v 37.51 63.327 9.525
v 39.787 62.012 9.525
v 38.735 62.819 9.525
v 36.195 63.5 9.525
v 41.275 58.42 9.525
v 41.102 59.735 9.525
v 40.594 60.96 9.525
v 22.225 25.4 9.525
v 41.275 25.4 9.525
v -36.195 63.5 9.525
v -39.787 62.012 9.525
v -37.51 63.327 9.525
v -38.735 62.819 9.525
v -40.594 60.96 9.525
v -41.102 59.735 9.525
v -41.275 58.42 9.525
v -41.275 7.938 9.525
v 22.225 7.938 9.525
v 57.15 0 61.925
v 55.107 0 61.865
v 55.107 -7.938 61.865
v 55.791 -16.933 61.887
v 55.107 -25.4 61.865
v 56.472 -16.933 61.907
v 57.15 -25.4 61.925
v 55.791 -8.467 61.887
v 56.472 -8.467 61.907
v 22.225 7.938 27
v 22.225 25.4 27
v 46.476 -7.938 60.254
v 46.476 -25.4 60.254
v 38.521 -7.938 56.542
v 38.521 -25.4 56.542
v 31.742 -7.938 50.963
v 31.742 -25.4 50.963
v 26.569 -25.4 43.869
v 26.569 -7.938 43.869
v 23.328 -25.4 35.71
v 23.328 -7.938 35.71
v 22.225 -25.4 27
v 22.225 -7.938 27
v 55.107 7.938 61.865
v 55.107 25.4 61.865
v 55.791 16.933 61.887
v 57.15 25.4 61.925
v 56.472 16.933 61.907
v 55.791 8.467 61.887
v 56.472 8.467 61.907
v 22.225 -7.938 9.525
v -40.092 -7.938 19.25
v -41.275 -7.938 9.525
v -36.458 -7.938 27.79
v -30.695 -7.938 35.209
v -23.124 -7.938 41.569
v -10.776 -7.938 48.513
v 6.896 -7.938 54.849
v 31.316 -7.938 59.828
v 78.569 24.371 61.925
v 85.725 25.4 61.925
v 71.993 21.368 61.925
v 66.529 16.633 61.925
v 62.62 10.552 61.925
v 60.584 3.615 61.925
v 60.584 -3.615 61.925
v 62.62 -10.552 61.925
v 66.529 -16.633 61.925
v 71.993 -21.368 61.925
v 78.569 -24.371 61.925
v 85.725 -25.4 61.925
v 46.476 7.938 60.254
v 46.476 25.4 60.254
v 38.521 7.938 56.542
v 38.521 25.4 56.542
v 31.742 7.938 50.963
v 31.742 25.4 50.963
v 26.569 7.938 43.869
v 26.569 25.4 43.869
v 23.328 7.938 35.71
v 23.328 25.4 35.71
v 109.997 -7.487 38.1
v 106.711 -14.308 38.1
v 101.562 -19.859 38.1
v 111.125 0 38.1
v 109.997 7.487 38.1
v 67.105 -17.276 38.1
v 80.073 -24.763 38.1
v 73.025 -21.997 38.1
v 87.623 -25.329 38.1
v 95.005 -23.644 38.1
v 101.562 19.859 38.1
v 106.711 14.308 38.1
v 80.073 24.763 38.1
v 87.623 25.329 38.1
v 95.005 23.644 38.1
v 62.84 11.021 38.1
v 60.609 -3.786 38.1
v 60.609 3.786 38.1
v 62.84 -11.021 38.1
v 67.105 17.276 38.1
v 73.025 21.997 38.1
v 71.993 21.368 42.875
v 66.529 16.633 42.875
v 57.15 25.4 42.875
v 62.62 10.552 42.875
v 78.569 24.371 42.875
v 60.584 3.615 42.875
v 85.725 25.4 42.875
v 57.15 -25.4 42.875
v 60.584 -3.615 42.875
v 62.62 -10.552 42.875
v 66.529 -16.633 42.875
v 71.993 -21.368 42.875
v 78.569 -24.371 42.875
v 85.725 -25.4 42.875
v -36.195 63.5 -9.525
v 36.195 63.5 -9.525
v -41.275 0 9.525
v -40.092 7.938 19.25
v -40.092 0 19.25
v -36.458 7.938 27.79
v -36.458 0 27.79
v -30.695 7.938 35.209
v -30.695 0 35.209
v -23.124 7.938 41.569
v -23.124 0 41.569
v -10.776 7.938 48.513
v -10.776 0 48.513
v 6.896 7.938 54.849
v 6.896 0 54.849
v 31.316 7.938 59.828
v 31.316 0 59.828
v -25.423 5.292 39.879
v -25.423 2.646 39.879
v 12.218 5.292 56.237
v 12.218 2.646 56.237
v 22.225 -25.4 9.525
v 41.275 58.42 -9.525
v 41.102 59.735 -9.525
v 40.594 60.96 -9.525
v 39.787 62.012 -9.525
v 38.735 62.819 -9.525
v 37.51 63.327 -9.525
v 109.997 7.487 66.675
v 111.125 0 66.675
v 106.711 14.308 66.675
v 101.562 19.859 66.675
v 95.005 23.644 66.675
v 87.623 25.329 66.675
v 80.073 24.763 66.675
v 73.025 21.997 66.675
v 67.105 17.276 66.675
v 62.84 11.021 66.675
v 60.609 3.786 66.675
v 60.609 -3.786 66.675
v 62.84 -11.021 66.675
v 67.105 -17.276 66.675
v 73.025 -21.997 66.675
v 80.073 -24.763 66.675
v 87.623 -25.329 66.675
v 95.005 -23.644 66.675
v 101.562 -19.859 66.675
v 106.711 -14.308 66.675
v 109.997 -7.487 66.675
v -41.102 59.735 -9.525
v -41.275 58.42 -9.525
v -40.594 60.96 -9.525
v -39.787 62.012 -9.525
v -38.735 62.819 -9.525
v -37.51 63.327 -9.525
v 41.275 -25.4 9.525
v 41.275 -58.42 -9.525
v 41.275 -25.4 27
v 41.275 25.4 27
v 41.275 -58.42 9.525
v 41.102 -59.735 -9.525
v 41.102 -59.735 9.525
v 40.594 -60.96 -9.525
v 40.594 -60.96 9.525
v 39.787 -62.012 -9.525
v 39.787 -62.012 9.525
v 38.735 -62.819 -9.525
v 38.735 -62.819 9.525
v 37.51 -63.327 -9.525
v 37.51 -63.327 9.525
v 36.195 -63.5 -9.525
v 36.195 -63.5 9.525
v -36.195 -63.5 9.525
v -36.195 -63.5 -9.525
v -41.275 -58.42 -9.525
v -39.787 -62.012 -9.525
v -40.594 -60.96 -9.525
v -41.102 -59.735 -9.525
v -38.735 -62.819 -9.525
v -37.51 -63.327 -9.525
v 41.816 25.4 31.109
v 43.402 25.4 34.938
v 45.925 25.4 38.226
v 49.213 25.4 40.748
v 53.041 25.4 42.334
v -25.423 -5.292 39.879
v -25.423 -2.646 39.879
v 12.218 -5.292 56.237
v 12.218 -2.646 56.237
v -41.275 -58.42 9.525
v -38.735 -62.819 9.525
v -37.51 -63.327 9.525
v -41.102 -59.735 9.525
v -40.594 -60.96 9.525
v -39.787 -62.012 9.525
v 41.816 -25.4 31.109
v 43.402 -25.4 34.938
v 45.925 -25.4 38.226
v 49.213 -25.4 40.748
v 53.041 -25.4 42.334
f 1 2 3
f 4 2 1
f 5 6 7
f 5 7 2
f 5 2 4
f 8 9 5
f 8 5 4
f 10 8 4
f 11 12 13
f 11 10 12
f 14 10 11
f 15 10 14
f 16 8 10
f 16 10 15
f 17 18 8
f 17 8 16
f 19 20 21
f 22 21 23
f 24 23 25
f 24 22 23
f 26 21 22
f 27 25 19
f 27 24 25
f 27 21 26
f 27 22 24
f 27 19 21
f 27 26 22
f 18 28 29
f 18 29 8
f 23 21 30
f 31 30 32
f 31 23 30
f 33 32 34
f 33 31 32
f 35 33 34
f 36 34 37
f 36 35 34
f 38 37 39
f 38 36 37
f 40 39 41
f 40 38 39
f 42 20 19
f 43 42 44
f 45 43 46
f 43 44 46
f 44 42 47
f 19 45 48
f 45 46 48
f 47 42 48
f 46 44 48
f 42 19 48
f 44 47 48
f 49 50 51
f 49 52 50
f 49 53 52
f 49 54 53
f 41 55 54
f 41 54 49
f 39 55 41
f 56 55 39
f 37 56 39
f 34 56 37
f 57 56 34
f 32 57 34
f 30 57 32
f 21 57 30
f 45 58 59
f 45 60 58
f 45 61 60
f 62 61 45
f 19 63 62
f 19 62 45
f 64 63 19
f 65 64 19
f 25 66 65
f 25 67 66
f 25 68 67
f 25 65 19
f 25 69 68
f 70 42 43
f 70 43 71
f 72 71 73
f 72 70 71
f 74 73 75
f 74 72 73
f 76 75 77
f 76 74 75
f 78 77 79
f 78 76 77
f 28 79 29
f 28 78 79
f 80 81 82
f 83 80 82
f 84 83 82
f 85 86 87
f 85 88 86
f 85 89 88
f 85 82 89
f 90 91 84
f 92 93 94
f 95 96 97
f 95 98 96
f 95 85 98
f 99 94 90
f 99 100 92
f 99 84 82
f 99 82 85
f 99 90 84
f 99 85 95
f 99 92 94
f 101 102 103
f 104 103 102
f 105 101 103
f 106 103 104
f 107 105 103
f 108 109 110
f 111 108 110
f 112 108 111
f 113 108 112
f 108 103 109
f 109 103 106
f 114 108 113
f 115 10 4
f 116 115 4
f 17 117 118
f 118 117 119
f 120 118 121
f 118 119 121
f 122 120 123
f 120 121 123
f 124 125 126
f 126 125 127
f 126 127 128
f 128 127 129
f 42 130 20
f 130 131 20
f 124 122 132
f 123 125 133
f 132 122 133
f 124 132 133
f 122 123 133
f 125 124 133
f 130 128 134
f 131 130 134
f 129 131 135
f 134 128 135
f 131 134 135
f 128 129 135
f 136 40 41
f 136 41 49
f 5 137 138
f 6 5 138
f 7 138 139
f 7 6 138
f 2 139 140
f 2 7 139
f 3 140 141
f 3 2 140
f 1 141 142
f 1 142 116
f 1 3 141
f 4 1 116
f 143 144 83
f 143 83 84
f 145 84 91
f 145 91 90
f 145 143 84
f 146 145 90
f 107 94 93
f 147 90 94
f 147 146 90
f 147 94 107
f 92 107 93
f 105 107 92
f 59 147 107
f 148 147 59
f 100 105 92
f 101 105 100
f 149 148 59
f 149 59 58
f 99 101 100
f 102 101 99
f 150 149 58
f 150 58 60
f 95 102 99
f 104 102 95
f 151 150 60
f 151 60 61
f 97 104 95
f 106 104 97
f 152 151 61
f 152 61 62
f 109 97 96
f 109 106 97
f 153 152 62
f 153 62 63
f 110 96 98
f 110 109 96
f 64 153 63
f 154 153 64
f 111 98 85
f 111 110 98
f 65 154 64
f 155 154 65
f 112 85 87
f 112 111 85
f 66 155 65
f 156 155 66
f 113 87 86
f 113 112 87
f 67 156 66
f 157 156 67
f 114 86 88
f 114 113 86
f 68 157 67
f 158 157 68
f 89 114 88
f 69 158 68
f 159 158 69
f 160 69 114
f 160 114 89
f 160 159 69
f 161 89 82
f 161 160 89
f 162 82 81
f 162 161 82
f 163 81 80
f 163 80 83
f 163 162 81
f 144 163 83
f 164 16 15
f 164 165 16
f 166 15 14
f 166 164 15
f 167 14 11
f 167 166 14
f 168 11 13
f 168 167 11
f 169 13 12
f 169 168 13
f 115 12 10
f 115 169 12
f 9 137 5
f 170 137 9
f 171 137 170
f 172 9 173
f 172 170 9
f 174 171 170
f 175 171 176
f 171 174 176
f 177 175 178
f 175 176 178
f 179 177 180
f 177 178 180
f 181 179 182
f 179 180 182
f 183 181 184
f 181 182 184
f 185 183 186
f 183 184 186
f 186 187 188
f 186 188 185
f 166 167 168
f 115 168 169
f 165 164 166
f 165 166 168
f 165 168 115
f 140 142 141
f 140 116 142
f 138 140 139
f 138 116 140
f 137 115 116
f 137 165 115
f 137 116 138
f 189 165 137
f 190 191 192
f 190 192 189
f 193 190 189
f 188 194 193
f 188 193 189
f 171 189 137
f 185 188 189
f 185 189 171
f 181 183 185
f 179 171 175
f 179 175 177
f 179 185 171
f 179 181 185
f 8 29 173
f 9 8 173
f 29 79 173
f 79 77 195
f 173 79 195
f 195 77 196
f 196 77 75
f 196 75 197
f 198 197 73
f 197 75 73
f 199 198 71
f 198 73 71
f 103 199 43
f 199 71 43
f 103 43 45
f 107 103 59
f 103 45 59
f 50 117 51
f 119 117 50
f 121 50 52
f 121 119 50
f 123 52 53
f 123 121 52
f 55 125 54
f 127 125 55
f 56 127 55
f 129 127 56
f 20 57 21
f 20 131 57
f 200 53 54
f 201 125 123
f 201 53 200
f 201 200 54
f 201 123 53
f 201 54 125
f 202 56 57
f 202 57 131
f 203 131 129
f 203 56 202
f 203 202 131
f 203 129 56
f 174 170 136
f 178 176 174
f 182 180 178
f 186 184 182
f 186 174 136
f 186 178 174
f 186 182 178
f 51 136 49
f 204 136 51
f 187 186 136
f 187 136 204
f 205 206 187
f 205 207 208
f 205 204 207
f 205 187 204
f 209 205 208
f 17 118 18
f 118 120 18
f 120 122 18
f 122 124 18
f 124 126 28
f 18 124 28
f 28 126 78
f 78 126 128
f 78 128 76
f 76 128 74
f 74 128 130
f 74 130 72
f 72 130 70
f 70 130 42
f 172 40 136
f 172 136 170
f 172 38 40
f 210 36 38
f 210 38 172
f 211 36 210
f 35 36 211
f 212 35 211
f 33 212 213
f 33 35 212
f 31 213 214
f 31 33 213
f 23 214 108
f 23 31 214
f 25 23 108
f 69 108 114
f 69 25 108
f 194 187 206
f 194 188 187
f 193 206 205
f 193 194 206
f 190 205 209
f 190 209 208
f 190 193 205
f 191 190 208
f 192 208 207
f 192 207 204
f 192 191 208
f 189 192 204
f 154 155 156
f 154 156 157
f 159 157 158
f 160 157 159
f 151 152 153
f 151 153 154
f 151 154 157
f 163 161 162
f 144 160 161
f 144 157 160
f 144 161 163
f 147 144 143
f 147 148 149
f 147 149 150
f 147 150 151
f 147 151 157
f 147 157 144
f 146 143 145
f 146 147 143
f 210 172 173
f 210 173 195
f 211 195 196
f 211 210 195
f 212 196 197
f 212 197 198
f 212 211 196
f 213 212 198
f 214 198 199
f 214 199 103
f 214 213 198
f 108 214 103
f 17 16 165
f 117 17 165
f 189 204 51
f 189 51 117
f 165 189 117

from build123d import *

# Parameters (mm, degrees)
F1_DEPTH = 63.5
F0_W     = 25.4
F0_H     = 19.05
F2_DEPTH = 25.4
F3_DEPTH = 7.9375
F5_R     = 5.08


with BuildPart() as f1:
    # F0 (on Front) → F1 (new body, symmetric)
    with BuildSketch(Plane.XZ):
        Polygon((41.275, -9.525), (41.275, 9.525), (22.225, 9.525), (-41.275, 9.525), (-41.275, -9.525), align=None)
    extrude(amount=F1_DEPTH, both=True)

    # F0 (on Front) → F2 (join, symmetric)
    with BuildSketch(Plane.XZ):
        with BuildLine():
            Line((22.225, 9.525), (41.275, 9.525))
            Line((41.275, 9.525), (41.275, 27.0002))
            ThreePointArc((41.275, 27.0002), (45.9246798487, 38.2255201513), (57.15, 42.8752))
            Line((57.15, 42.8752), (60.325, 42.8752))
            Line((60.325, 42.8752), (60.325, 61.9252))
            Line((60.325, 61.9252), (57.15, 61.9252))
            add(Edge.make_bspline(
                [(55.1065701704, 61.8653691453), (55.7928245706, 61.8885825156), (56.4740931421, 61.9085013809), (57.15, 61.9252)],
                knots=[109.6237509197, 109.6237509197, 109.6237509197, 109.6237509197, 111.5045361635, 111.5045361635, 111.5045361635, 111.5045361635], degree=3))
            ThreePointArc((55.1065701704, 61.8653691453), (31.7421034735, 50.9625542062), (22.225, 27.0002))
            Line((22.225, 27.0002), (22.225, 9.525))
        make_face()
        with Locations((73.025, 52.4002)):
            Rectangle(F0_W, F0_H)
    extrude(amount=F2_DEPTH, both=True)

    # F0 (on Front) → F3 (join, symmetric)
    with BuildSketch(Plane.XZ):
        with BuildLine():
            Line((-41.275, 9.525), (22.225, 9.525))
            Line((22.225, 9.525), (22.225, 27.0002))
            ThreePointArc((22.225, 27.0002), (31.7421034735, 50.9625542062), (55.1065701704, 61.8653691453))
            add(Edge.make_bspline(
                [(-41.275, 9.525), (-41.8299371409, 47.9669883241), (15.1074359349, 60.5123509154), (55.1065701704, 61.8653691453)],
                knots=[0, 0, 0, 0, 109.6237509197, 109.6237509197, 109.6237509197, 109.6237509197], degree=3))
        make_face()
    extrude(amount=F3_DEPTH, both=True)

    # F0 (on Front) → F4 (revolve)
    with BuildSketch(Plane.XZ):
        Polygon((85.725, 61.9252), (85.725, 42.8752), (85.725, 38.1), (111.125, 38.1), (111.125, 66.675), (85.725, 66.675), align=None)
    revolve(axis=Axis((85.725, 0, 52.3875), (0, 0, 1)))

    # F5
    f5_edges = [f1.edges().sort_by_distance(p)[0] for p in [
        (41.275, -63.5, 0),
        (-41.275, -63.5, 0),
        (-41.275, 63.5, 0),
        (41.275, 63.5, 0),
    ]]
    fillet(f5_edges, radius=F5_R)


solid = f1.part
